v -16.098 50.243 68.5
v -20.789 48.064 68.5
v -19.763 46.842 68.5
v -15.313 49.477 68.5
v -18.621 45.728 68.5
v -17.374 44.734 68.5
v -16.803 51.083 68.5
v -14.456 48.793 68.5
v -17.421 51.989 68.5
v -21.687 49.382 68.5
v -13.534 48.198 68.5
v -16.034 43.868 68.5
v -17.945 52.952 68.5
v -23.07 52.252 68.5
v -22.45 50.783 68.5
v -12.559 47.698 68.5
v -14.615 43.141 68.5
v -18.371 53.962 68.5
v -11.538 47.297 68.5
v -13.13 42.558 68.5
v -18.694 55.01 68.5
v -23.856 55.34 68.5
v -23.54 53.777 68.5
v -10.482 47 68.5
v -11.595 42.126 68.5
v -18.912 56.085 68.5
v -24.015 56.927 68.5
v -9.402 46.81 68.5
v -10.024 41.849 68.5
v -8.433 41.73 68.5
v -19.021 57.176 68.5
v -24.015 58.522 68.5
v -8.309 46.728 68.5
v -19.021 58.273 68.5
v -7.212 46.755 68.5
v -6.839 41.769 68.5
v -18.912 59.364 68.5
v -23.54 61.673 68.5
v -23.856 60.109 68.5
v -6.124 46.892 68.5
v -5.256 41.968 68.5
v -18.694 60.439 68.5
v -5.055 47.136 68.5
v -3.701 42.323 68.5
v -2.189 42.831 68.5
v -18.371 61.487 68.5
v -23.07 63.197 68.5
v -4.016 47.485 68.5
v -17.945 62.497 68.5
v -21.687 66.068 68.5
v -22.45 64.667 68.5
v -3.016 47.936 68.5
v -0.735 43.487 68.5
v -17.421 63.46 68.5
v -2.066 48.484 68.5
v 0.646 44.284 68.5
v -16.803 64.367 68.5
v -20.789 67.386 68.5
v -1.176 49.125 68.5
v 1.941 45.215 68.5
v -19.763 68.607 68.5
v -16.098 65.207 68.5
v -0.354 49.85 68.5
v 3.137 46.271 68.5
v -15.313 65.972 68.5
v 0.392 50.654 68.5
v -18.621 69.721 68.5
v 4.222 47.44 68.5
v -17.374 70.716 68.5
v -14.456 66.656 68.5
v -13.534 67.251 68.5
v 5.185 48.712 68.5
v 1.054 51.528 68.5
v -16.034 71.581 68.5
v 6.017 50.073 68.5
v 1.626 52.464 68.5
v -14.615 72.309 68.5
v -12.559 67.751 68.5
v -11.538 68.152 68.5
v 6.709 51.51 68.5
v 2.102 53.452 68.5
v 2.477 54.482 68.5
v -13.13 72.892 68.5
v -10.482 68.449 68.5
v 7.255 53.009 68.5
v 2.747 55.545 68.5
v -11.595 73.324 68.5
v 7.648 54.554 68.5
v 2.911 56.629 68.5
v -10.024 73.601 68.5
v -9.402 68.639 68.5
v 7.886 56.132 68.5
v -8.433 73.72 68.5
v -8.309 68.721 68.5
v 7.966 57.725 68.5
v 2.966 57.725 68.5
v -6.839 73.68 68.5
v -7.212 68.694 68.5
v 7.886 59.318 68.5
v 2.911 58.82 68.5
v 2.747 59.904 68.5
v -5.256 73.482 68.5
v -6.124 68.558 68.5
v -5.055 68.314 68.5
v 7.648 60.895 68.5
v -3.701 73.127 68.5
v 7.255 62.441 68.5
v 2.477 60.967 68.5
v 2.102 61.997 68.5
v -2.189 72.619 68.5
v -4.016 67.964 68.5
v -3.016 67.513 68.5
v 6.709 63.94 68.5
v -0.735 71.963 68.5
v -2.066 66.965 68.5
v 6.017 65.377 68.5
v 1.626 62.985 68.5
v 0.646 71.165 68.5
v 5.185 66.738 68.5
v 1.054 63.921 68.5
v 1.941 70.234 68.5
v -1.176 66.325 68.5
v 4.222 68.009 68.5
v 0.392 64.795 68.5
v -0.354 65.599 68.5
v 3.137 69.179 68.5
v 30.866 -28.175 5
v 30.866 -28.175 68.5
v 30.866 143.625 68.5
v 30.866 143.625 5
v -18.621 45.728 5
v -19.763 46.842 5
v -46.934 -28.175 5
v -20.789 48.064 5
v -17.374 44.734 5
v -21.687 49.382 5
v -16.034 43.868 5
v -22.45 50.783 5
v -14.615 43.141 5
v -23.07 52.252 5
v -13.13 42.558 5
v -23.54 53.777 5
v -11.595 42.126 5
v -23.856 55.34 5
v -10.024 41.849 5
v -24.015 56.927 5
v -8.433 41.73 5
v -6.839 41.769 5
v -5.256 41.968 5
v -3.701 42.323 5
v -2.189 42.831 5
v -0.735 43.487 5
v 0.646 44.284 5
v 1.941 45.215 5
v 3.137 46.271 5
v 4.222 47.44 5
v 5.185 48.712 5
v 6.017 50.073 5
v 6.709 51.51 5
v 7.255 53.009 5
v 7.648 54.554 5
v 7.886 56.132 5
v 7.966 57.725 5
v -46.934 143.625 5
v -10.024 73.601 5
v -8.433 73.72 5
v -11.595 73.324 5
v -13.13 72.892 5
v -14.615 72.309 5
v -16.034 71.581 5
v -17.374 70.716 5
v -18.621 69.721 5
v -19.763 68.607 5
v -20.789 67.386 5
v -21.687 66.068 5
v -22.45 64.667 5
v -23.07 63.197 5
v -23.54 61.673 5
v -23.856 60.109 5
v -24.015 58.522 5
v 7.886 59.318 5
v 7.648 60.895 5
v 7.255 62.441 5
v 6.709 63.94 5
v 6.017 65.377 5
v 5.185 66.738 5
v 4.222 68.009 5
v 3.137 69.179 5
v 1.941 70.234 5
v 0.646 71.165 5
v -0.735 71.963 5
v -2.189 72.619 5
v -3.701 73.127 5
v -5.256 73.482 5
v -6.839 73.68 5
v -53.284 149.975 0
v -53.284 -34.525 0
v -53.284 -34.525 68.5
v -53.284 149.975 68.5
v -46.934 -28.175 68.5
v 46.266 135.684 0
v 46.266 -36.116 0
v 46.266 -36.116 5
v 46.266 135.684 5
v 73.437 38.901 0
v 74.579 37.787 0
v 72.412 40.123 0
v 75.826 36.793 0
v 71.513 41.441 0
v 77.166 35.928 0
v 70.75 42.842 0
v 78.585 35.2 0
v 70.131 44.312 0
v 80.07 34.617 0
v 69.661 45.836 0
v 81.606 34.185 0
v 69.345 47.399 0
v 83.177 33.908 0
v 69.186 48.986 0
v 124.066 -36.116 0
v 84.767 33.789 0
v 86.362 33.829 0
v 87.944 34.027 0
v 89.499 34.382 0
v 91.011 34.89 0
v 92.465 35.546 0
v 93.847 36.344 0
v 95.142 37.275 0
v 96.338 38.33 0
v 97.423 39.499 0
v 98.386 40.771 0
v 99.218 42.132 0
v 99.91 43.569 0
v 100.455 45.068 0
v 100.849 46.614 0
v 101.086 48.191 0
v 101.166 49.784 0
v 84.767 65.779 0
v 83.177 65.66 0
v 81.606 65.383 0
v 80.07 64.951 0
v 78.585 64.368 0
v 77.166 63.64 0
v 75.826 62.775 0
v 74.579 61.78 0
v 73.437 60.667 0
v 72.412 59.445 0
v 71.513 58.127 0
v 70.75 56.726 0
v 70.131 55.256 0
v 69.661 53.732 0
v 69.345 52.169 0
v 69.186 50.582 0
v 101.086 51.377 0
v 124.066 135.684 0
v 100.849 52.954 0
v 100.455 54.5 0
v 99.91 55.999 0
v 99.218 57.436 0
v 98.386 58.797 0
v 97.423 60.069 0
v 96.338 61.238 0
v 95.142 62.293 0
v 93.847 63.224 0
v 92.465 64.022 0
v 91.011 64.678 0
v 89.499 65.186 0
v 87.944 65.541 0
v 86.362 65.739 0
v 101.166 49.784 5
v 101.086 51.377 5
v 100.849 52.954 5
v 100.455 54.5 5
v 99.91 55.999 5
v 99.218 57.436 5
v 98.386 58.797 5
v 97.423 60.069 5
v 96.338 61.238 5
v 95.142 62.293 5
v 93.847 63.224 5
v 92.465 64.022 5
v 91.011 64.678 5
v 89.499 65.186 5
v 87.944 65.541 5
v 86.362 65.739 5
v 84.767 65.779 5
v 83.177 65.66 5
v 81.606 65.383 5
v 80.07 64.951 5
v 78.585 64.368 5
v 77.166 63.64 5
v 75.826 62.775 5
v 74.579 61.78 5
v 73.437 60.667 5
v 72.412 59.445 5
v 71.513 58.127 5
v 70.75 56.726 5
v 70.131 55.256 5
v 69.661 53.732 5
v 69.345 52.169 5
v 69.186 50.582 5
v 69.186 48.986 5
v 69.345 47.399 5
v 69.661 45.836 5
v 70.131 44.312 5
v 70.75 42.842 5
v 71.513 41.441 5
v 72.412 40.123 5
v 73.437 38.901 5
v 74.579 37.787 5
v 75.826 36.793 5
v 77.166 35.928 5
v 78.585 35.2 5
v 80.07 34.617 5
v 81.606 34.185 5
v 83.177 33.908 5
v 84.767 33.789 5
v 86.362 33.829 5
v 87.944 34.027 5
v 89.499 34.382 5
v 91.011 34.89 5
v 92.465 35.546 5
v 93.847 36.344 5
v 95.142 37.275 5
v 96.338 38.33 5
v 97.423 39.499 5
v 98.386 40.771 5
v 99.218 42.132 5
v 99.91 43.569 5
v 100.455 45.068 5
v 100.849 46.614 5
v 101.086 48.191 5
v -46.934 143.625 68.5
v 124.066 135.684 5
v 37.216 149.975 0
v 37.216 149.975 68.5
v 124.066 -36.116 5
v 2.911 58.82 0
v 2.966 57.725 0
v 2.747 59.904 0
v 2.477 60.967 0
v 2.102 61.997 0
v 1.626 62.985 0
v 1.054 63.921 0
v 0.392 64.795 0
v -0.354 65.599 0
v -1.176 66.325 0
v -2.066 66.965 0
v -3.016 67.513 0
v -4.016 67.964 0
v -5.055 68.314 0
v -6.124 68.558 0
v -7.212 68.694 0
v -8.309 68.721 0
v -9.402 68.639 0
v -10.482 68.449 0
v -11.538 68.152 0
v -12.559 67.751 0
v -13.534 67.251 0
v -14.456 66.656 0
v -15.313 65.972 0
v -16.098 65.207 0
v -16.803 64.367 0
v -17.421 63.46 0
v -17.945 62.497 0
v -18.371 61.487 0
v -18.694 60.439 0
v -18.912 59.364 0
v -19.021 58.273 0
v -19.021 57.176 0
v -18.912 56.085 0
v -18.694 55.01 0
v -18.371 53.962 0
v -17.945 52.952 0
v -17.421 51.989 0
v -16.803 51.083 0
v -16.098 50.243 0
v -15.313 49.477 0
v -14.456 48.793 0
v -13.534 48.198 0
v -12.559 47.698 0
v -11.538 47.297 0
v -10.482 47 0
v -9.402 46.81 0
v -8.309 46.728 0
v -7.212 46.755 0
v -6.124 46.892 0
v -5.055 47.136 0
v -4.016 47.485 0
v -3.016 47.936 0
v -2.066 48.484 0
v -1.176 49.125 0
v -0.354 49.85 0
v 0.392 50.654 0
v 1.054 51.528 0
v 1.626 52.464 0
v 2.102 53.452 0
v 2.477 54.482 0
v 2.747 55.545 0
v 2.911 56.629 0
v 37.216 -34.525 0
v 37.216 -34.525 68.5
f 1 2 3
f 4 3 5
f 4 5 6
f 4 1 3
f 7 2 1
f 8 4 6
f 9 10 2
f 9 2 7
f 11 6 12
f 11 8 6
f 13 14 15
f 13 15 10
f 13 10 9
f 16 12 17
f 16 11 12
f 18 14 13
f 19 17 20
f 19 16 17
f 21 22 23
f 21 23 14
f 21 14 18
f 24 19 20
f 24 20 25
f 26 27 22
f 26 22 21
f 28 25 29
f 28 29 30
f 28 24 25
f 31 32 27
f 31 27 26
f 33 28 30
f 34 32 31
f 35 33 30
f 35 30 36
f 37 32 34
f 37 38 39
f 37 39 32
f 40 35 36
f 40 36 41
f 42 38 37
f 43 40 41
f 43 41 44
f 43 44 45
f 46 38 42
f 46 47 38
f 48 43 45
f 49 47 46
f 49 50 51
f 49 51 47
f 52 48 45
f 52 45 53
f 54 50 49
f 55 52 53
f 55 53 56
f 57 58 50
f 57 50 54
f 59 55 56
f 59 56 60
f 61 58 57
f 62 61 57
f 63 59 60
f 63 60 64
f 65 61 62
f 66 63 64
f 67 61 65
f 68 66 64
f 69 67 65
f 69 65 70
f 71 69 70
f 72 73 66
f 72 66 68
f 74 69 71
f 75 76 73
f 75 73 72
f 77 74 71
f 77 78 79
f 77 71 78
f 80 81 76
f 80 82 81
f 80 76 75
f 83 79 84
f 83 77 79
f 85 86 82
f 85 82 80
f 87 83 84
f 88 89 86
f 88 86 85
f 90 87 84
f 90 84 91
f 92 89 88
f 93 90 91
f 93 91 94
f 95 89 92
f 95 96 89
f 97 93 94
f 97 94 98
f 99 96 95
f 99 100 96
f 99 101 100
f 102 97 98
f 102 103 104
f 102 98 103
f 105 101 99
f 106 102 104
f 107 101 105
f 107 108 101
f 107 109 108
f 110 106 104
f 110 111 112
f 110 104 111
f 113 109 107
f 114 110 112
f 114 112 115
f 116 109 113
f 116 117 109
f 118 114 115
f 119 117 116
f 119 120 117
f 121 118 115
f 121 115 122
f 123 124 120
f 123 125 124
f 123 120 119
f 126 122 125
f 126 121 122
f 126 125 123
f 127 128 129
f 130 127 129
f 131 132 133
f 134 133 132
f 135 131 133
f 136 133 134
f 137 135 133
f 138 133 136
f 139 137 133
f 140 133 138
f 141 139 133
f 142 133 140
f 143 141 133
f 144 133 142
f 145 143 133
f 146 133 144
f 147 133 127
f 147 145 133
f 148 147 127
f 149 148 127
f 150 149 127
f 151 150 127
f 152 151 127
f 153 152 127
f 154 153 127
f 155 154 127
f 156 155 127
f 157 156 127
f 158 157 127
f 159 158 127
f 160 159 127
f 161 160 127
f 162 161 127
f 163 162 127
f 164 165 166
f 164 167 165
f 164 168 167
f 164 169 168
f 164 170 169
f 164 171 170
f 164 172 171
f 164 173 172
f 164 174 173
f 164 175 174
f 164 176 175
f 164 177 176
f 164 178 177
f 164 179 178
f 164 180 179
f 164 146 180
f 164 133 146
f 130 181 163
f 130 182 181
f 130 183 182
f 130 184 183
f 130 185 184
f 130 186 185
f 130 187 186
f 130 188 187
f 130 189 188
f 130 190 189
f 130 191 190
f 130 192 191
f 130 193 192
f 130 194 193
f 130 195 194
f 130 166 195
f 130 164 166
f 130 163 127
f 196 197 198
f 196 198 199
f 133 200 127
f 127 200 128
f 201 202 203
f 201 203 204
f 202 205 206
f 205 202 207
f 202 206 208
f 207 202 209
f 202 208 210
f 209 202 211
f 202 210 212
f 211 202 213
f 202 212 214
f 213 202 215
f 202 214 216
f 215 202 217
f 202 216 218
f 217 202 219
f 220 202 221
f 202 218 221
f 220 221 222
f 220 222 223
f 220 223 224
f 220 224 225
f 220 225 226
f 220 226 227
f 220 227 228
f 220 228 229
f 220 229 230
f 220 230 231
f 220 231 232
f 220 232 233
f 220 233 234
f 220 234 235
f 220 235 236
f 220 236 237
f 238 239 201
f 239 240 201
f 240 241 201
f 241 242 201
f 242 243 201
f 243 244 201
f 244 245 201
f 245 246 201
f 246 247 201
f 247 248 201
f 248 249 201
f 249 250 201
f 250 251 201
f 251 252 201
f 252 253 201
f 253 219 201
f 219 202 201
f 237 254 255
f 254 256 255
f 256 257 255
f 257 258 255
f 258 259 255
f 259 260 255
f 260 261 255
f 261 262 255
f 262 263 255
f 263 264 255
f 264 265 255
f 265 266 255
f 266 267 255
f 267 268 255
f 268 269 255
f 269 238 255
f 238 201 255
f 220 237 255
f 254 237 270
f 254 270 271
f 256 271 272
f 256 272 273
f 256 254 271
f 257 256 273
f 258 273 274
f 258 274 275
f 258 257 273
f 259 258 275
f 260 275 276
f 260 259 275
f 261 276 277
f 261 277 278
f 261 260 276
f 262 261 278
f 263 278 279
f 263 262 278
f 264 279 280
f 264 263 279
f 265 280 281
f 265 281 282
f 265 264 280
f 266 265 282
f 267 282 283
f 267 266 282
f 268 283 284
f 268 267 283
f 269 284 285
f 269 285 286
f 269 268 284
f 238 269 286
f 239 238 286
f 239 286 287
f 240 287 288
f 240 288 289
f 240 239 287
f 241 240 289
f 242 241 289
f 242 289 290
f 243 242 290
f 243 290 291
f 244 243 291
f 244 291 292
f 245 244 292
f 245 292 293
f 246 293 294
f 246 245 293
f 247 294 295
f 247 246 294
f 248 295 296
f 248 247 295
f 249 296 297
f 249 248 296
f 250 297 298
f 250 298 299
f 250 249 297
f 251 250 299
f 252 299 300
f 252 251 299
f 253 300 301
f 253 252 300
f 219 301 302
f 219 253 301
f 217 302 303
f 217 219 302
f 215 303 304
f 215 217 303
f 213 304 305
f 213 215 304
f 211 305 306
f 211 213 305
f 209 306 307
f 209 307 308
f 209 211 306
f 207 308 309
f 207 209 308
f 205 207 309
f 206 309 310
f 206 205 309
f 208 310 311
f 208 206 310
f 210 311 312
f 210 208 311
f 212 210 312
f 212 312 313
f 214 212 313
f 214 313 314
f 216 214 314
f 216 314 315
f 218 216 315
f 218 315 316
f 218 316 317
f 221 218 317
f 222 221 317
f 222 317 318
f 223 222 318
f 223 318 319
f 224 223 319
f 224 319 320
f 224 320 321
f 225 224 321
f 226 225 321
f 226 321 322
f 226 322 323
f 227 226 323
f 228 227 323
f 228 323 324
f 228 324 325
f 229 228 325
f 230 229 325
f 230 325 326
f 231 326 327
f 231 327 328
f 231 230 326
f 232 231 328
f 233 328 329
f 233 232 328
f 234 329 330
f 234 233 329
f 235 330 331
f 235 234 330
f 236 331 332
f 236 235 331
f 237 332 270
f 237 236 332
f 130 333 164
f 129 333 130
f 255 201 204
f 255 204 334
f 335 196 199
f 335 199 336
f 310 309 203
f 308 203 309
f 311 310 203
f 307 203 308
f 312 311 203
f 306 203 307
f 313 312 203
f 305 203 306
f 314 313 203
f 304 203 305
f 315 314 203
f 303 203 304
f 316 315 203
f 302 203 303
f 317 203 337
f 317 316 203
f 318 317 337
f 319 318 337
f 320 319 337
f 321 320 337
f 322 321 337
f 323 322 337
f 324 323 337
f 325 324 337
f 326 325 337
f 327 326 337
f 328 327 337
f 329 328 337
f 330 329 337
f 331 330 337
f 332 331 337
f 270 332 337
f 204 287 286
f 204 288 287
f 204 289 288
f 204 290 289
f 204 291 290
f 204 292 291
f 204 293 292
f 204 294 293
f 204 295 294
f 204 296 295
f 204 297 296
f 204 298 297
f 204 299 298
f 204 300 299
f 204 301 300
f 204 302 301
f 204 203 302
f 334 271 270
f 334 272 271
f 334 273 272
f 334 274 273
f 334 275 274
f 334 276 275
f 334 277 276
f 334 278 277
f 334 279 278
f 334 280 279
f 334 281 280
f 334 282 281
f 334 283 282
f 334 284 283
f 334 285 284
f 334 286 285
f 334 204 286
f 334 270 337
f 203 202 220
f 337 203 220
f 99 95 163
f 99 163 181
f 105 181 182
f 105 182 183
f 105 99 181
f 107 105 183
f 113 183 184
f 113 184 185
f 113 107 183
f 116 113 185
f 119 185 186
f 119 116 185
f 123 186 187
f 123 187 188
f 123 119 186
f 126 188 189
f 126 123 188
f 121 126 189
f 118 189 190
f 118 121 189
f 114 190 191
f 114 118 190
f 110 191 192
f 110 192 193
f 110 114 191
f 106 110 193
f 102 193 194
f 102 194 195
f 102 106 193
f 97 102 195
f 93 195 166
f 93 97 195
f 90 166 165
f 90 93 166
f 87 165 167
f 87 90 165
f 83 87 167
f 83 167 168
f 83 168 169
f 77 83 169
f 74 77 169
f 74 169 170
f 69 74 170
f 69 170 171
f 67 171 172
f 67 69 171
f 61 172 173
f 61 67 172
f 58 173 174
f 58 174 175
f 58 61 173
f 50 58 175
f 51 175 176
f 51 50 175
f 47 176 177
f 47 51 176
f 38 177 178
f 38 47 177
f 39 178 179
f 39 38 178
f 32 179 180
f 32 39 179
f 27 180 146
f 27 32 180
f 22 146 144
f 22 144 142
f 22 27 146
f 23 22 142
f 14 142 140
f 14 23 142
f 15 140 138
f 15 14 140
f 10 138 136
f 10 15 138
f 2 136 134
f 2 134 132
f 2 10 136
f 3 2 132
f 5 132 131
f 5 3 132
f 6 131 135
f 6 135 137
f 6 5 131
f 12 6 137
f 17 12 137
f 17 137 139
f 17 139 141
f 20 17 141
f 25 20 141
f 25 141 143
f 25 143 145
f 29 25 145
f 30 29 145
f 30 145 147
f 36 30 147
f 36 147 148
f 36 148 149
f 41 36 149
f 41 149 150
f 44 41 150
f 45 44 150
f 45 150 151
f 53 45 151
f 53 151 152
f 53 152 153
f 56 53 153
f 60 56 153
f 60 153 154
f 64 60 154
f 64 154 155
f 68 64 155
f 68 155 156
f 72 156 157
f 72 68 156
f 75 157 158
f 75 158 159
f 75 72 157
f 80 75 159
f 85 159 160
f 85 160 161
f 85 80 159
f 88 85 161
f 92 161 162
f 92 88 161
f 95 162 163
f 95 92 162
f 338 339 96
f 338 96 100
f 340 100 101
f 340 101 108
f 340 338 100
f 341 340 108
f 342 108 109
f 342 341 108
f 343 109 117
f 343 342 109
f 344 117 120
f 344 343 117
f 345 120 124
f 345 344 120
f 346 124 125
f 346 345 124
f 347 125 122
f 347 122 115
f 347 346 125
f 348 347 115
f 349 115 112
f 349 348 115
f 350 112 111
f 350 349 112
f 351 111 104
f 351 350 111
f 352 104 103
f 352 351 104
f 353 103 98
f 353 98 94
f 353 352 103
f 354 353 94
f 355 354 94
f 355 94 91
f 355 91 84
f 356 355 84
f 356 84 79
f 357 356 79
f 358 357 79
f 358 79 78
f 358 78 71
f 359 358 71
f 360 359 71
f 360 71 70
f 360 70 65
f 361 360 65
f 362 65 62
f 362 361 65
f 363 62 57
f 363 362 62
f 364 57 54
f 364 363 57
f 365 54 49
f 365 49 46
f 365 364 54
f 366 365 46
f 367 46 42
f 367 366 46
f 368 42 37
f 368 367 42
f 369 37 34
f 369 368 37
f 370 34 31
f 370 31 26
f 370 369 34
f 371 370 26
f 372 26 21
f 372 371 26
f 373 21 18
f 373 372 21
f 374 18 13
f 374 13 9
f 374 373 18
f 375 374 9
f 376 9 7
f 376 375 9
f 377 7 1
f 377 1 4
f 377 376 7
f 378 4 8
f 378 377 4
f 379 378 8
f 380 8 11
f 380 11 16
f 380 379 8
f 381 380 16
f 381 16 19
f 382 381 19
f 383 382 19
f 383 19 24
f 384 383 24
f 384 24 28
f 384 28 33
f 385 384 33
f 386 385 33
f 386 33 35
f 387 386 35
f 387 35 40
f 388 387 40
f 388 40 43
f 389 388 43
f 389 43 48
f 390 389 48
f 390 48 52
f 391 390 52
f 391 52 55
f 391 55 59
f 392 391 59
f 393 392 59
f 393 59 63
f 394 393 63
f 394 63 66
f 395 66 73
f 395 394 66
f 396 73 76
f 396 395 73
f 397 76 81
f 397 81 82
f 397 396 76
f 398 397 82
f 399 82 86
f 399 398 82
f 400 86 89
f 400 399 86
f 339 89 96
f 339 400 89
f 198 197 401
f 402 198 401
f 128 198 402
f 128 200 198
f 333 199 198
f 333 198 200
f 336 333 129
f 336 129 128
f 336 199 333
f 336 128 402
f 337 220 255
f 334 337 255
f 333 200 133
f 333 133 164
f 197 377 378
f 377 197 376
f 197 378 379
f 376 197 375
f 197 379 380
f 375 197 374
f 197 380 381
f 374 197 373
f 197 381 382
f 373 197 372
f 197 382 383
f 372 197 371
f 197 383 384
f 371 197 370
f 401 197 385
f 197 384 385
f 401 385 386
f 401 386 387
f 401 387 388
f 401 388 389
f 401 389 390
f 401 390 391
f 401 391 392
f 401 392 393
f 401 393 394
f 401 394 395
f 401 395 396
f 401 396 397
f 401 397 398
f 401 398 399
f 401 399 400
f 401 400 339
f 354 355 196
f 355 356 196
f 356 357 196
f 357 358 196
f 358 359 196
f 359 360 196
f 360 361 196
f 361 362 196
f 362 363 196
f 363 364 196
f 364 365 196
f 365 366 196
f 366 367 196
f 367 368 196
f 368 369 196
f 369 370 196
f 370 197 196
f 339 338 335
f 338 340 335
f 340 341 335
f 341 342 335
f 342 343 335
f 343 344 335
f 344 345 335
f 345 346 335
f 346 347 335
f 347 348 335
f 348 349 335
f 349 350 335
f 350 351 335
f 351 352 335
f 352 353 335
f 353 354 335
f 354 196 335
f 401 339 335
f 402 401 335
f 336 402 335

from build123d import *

# Parameters (mm, degrees)
F0_W     = 90.5
F0_H     = 184.5
F0_R     = 11
F1_DEPTH = 68.5
F2_W     = 77.8
F2_H     = 171.8
F2_R     = 16
F3_DEPTH = 63.5
F4_W     = 77.8
F4_H     = 171.8
F4_R     = 16
F5_DEPTH = 5


with BuildPart() as f1:
    # F0 (on Top) → F1 (new body)
    with BuildSketch(Plane.XY):
        with Locations((-8.034482, 57.724688)):
            Rectangle(F0_W, F0_H)
        with Locations((-8.034482, 57.724688)):
            Circle(F0_R, mode=Mode.SUBTRACT)
    extrude(amount=F1_DEPTH)

    # F2 (on face) → F3 (cut)
    with BuildSketch(Plane.XY.offset(68.5)):
        with Locations((-8.034482, 57.724688)):
            Rectangle(F2_W, F2_H)
        with Locations((-8.034482, 57.724688)):
            Circle(F2_R, mode=Mode.SUBTRACT)
    extrude(amount=-F3_DEPTH, mode=Mode.SUBTRACT)


with BuildPart() as f5:
    # F4 (on Top) → F5 (new body)
    with BuildSketch(Plane.XY):
        with Locations((85.166001, 49.783996)):
            Rectangle(F4_W, F4_H)
        with Locations((85.166001, 49.783996)):
            Circle(F4_R, mode=Mode.SUBTRACT)
    extrude(amount=F5_DEPTH)


solid = Compound([f1.part, f5.part])
